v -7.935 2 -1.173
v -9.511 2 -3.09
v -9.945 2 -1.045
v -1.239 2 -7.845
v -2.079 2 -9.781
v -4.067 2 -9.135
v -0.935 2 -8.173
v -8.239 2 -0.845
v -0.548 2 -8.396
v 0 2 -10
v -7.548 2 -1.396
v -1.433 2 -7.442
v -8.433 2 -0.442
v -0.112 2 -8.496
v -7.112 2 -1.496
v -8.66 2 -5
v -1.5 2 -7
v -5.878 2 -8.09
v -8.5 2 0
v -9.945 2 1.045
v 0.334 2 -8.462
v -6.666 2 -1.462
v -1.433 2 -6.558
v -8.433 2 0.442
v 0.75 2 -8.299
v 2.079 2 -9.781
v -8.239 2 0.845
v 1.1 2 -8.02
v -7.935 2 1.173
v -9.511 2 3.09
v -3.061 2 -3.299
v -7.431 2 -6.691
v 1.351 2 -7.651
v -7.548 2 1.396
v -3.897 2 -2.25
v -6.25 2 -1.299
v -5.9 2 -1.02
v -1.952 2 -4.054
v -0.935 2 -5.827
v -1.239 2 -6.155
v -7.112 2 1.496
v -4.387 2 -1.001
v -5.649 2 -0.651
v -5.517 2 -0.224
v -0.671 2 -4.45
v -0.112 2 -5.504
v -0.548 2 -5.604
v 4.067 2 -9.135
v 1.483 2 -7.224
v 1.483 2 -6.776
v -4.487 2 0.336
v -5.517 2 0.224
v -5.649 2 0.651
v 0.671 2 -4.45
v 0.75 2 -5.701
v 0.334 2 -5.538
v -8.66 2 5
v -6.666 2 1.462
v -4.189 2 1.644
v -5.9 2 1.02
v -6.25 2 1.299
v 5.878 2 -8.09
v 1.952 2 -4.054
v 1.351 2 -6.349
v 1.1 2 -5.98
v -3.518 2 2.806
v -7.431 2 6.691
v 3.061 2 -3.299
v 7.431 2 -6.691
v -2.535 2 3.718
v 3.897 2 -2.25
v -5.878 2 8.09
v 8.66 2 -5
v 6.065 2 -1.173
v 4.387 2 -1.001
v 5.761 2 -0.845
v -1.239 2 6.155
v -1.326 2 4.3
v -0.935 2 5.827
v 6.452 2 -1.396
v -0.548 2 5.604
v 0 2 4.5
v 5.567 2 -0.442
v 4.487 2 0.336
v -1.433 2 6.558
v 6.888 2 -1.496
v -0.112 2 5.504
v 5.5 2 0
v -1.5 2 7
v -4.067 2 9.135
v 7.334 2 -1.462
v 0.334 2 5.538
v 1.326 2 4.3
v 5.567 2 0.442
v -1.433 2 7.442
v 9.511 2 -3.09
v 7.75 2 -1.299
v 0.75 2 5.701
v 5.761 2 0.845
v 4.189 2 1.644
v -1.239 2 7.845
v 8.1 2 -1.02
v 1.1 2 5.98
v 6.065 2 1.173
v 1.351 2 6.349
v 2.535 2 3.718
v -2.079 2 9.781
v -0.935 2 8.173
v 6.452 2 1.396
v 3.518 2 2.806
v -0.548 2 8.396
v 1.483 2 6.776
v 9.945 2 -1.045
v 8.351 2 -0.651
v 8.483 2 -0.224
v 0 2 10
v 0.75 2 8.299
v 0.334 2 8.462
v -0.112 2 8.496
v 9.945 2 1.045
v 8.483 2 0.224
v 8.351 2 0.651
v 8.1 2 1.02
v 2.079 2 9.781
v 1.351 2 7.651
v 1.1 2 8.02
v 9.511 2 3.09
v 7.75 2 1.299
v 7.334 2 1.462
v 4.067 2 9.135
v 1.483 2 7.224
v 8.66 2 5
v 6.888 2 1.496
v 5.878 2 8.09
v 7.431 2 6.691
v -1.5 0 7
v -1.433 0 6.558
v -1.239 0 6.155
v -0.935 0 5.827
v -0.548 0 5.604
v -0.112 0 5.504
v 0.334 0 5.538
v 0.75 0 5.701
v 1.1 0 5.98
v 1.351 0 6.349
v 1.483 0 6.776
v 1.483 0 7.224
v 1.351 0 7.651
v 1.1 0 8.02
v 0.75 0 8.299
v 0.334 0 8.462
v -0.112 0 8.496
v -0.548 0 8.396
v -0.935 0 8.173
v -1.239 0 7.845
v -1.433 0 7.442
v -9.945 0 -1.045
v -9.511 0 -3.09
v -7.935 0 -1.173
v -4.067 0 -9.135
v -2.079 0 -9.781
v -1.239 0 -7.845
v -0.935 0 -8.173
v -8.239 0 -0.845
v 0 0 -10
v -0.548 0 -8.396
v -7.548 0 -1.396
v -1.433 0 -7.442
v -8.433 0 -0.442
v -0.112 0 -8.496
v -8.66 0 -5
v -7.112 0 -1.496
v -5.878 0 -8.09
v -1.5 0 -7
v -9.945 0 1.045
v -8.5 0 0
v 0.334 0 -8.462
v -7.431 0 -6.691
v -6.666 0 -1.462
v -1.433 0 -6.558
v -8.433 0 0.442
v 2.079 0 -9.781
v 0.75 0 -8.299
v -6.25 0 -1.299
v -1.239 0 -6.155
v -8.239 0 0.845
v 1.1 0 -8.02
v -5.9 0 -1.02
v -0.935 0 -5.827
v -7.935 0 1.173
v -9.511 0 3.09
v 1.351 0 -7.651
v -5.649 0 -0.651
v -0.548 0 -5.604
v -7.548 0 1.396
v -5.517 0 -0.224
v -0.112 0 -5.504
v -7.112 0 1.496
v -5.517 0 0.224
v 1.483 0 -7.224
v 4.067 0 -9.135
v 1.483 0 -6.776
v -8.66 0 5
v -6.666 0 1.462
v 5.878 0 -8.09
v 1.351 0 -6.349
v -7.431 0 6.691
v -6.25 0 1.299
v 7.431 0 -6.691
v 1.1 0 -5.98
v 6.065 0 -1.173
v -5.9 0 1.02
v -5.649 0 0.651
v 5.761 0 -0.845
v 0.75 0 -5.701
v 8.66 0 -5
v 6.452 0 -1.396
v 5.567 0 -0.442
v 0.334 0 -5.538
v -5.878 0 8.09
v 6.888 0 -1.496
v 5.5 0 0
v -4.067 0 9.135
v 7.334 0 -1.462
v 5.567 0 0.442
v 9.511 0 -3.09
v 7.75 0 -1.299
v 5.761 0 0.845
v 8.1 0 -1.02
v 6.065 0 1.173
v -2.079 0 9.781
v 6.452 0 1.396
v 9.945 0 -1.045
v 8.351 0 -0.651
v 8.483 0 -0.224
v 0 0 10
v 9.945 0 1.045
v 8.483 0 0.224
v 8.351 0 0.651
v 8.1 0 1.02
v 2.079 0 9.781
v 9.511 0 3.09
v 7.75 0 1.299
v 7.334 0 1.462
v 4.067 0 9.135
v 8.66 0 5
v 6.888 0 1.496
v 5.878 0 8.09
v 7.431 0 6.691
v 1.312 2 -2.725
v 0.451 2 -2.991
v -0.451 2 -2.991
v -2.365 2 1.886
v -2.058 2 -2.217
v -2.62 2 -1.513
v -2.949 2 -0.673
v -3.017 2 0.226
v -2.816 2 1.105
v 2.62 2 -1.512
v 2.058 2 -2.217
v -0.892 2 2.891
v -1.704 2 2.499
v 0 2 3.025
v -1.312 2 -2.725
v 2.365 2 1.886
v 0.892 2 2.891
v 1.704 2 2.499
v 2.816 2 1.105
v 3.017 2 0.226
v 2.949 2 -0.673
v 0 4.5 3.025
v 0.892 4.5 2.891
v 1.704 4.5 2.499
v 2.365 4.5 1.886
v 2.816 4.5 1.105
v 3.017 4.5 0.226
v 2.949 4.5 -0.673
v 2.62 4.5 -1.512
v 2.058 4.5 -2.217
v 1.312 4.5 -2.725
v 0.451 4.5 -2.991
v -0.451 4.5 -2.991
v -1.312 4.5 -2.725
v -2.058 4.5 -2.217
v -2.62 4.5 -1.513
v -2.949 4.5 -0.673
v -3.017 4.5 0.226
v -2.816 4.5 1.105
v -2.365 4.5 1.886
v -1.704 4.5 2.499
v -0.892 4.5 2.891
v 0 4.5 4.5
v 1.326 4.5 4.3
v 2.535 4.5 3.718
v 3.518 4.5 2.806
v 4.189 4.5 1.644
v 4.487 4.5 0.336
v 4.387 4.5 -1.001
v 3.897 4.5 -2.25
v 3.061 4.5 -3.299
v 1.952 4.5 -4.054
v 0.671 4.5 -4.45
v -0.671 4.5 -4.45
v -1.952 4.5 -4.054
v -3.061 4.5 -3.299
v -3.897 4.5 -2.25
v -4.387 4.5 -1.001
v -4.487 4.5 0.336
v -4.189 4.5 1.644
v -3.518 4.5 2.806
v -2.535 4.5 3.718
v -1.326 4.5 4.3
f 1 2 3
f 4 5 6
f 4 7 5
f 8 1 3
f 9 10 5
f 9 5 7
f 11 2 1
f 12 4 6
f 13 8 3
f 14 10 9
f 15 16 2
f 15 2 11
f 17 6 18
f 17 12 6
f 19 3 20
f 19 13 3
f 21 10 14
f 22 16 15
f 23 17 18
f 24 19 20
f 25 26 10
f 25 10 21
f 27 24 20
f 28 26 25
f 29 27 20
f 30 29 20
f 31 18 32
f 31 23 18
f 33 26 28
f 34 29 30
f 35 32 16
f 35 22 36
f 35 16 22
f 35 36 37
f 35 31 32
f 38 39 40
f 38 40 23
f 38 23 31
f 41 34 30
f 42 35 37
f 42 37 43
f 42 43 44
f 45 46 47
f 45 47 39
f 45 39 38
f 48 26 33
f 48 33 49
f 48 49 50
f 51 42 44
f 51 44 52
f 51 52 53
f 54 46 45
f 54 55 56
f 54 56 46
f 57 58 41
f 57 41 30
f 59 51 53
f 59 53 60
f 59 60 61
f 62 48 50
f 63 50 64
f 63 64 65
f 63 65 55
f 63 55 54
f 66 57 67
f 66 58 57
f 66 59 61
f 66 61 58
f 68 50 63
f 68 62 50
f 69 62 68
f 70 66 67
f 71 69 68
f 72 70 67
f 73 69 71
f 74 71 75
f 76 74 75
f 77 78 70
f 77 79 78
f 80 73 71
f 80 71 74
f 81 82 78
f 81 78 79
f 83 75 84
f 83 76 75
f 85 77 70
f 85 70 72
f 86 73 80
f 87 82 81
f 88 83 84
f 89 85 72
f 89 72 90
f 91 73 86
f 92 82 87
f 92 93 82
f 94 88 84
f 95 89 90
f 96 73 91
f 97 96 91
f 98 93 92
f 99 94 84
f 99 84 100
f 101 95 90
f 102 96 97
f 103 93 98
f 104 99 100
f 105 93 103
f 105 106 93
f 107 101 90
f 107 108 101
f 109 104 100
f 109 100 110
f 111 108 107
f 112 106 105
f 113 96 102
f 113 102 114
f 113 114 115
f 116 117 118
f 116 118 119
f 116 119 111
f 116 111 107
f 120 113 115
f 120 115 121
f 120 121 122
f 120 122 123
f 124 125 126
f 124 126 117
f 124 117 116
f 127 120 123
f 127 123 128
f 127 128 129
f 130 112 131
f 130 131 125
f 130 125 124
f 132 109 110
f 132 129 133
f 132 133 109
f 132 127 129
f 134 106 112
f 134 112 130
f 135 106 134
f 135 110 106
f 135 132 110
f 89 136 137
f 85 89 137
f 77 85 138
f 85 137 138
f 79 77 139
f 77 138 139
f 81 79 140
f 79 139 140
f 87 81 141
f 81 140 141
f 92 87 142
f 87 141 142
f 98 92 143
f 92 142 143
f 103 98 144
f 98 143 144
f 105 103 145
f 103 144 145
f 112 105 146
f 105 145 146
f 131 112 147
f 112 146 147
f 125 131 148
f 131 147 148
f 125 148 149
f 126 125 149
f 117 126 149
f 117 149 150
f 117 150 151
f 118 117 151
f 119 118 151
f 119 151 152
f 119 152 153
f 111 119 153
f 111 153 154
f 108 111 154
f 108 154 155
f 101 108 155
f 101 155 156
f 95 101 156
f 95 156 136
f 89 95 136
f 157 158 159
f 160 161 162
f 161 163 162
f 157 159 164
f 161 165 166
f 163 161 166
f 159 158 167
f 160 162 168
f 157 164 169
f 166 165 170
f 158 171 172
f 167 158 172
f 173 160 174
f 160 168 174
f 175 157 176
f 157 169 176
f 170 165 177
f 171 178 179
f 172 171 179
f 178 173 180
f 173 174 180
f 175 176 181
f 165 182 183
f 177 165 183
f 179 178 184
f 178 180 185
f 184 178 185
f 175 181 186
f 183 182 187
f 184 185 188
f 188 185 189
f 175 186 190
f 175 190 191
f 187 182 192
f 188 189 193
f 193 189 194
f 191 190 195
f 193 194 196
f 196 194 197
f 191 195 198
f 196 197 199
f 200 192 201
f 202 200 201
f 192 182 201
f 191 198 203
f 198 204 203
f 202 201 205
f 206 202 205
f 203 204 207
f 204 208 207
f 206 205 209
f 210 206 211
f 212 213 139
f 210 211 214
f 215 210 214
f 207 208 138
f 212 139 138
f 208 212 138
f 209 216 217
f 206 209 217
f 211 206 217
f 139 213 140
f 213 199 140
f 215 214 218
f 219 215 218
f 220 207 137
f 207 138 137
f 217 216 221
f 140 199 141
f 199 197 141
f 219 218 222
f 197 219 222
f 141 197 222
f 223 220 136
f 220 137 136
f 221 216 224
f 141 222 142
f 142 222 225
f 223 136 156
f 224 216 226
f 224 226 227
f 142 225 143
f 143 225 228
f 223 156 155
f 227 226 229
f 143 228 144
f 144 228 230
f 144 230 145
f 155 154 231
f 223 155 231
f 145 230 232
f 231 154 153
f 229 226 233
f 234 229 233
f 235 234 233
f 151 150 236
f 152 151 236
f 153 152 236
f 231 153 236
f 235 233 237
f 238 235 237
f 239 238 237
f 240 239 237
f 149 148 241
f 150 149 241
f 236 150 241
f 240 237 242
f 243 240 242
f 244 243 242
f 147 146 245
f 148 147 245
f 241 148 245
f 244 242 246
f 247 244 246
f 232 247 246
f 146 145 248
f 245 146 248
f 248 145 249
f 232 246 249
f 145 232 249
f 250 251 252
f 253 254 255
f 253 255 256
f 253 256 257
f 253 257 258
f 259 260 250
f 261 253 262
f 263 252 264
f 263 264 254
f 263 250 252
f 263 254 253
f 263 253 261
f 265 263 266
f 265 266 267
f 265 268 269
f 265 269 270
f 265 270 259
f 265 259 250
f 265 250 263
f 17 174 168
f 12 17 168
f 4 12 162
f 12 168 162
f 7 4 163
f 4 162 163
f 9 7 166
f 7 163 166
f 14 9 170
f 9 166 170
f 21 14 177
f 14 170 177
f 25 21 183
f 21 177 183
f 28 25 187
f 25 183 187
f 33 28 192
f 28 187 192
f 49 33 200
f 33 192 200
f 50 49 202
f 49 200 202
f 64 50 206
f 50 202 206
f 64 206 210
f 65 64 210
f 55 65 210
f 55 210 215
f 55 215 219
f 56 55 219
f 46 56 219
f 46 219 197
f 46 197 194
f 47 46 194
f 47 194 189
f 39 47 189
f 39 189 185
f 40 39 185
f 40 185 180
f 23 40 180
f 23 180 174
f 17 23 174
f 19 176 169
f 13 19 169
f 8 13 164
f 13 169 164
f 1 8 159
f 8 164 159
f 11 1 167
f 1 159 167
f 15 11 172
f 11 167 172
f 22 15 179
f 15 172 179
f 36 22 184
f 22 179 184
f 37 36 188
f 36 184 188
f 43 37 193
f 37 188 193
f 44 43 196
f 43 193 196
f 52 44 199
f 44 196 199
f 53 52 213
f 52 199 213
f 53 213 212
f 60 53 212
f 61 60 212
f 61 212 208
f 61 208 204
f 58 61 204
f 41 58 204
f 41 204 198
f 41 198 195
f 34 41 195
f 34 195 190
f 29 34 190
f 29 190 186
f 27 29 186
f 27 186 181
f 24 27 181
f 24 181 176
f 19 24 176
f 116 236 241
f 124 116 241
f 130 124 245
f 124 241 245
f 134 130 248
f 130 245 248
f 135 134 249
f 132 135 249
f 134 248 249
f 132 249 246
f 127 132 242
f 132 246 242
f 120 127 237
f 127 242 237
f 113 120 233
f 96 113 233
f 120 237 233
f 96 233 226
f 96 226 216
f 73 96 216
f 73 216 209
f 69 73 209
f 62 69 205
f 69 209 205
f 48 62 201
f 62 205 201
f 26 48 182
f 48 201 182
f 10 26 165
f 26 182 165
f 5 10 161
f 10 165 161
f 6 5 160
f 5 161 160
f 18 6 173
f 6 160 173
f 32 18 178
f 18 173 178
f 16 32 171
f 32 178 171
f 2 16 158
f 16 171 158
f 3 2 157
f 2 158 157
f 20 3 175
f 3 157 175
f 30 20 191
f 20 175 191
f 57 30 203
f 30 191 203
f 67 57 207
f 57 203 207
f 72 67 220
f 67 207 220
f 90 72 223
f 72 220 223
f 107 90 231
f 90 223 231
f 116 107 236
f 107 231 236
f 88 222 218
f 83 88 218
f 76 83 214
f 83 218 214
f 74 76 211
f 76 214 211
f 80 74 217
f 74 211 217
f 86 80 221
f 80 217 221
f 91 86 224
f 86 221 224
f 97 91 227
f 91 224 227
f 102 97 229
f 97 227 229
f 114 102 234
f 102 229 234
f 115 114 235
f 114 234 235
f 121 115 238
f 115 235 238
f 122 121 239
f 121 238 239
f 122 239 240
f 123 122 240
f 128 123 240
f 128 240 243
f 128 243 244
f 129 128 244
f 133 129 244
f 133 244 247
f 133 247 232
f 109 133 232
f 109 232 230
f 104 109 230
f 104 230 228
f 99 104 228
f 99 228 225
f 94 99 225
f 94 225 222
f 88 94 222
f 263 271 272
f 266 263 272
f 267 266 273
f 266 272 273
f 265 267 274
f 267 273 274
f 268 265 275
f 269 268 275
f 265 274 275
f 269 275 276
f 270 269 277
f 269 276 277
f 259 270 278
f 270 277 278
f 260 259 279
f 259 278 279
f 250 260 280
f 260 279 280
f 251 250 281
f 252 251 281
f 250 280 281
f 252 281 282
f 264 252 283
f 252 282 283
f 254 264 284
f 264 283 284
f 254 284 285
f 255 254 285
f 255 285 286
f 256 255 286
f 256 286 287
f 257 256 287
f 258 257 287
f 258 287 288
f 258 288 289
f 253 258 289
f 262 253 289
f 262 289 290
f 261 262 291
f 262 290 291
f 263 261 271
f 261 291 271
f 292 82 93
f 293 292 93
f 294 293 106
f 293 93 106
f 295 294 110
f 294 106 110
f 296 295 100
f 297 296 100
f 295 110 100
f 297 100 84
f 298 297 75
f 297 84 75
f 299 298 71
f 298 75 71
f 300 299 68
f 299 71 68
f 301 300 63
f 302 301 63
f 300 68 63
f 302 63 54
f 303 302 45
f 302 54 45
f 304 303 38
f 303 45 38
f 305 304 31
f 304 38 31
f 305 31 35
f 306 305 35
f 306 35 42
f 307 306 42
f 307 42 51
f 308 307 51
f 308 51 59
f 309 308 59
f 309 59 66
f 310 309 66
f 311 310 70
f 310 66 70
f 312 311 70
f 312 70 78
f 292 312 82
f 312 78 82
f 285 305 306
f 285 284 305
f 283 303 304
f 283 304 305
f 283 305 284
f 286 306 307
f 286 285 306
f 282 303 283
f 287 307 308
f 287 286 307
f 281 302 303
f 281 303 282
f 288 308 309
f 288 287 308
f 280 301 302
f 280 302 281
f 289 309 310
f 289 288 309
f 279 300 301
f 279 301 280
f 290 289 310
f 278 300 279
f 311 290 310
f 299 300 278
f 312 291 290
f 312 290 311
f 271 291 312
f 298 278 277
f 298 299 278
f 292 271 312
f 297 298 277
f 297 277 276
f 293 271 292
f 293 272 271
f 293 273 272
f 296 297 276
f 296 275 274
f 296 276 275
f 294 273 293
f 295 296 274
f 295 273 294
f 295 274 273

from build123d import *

# Parameters (mm, degrees)
CROQUIS1_R                        = 10
SALIENTE_EXTRUIR1_DEPTH           = 2
CROQUIS2_R                        = 4.5
SALIENTE_EXTRUIR2_DEPTH           = 2.5
DI_METRO_DE_TALADRO_3_0_3_1_D     = 3
DI_METRO_DE_TALADRO_3_0_3_1_DEPTH = 50
DI_METRO_DE_TALADRO_3_0_3_1_TIP   = 0.901290929
CROQUIS5_R                        = 3.025
CORTAR_EXTRUIR1_DEPTH             = 2.5


with BuildPart() as part:
    # Croquis1 → Saliente-Extruir1 (new body)
    with BuildSketch(Plane(origin=(0, 0, 0), x_dir=(1, 0, 0), z_dir=(0, 1, 0))):
        with Locations(Location((0, 0, 0), (0, 0, 270))):
            Circle(CROQUIS1_R)
    extrude(amount=SALIENTE_EXTRUIR1_DEPTH)

    # Croquis2 → Saliente-Extruir2 (add)
    with BuildSketch(Plane(origin=(0, 2, 0), x_dir=(1, 0, 0), z_dir=(0, 1, 0))):
        with Locations(Location((0, 0, 0), (0, 0, 270))):
            Circle(CROQUIS2_R)
    extrude(amount=SALIENTE_EXTRUIR2_DEPTH)

    # Diámetro de taladro Ø3.0 (3)1
    with Locations(Plane(origin=(0, 2, 0), x_dir=(1, 0, 0), z_dir=(0, 1, 0))):
        with Locations((0, 7), (-7, 0), (7, 0), (0, -7)):
            Hole(DI_METRO_DE_TALADRO_3_0_3_1_D / 2, depth=DI_METRO_DE_TALADRO_3_0_3_1_DEPTH)
            with Locations((0, 0, -(DI_METRO_DE_TALADRO_3_0_3_1_DEPTH + DI_METRO_DE_TALADRO_3_0_3_1_TIP / 2))):  # 118° drill point
                Cone(0, DI_METRO_DE_TALADRO_3_0_3_1_D / 2, DI_METRO_DE_TALADRO_3_0_3_1_TIP, mode=Mode.SUBTRACT)

    # Croquis5 → Cortar-Extruir1 (cut)
    with BuildSketch(Plane(origin=(0, 4.5, 0), x_dir=(1, 0, 0), z_dir=(0, 1, 0))):
        with Locations(Location((0, 0, 0), (0, 0, 270))):
            Circle(CROQUIS5_R)
    extrude(amount=-CORTAR_EXTRUIR1_DEPTH, mode=Mode.SUBTRACT)


solid = part.part
